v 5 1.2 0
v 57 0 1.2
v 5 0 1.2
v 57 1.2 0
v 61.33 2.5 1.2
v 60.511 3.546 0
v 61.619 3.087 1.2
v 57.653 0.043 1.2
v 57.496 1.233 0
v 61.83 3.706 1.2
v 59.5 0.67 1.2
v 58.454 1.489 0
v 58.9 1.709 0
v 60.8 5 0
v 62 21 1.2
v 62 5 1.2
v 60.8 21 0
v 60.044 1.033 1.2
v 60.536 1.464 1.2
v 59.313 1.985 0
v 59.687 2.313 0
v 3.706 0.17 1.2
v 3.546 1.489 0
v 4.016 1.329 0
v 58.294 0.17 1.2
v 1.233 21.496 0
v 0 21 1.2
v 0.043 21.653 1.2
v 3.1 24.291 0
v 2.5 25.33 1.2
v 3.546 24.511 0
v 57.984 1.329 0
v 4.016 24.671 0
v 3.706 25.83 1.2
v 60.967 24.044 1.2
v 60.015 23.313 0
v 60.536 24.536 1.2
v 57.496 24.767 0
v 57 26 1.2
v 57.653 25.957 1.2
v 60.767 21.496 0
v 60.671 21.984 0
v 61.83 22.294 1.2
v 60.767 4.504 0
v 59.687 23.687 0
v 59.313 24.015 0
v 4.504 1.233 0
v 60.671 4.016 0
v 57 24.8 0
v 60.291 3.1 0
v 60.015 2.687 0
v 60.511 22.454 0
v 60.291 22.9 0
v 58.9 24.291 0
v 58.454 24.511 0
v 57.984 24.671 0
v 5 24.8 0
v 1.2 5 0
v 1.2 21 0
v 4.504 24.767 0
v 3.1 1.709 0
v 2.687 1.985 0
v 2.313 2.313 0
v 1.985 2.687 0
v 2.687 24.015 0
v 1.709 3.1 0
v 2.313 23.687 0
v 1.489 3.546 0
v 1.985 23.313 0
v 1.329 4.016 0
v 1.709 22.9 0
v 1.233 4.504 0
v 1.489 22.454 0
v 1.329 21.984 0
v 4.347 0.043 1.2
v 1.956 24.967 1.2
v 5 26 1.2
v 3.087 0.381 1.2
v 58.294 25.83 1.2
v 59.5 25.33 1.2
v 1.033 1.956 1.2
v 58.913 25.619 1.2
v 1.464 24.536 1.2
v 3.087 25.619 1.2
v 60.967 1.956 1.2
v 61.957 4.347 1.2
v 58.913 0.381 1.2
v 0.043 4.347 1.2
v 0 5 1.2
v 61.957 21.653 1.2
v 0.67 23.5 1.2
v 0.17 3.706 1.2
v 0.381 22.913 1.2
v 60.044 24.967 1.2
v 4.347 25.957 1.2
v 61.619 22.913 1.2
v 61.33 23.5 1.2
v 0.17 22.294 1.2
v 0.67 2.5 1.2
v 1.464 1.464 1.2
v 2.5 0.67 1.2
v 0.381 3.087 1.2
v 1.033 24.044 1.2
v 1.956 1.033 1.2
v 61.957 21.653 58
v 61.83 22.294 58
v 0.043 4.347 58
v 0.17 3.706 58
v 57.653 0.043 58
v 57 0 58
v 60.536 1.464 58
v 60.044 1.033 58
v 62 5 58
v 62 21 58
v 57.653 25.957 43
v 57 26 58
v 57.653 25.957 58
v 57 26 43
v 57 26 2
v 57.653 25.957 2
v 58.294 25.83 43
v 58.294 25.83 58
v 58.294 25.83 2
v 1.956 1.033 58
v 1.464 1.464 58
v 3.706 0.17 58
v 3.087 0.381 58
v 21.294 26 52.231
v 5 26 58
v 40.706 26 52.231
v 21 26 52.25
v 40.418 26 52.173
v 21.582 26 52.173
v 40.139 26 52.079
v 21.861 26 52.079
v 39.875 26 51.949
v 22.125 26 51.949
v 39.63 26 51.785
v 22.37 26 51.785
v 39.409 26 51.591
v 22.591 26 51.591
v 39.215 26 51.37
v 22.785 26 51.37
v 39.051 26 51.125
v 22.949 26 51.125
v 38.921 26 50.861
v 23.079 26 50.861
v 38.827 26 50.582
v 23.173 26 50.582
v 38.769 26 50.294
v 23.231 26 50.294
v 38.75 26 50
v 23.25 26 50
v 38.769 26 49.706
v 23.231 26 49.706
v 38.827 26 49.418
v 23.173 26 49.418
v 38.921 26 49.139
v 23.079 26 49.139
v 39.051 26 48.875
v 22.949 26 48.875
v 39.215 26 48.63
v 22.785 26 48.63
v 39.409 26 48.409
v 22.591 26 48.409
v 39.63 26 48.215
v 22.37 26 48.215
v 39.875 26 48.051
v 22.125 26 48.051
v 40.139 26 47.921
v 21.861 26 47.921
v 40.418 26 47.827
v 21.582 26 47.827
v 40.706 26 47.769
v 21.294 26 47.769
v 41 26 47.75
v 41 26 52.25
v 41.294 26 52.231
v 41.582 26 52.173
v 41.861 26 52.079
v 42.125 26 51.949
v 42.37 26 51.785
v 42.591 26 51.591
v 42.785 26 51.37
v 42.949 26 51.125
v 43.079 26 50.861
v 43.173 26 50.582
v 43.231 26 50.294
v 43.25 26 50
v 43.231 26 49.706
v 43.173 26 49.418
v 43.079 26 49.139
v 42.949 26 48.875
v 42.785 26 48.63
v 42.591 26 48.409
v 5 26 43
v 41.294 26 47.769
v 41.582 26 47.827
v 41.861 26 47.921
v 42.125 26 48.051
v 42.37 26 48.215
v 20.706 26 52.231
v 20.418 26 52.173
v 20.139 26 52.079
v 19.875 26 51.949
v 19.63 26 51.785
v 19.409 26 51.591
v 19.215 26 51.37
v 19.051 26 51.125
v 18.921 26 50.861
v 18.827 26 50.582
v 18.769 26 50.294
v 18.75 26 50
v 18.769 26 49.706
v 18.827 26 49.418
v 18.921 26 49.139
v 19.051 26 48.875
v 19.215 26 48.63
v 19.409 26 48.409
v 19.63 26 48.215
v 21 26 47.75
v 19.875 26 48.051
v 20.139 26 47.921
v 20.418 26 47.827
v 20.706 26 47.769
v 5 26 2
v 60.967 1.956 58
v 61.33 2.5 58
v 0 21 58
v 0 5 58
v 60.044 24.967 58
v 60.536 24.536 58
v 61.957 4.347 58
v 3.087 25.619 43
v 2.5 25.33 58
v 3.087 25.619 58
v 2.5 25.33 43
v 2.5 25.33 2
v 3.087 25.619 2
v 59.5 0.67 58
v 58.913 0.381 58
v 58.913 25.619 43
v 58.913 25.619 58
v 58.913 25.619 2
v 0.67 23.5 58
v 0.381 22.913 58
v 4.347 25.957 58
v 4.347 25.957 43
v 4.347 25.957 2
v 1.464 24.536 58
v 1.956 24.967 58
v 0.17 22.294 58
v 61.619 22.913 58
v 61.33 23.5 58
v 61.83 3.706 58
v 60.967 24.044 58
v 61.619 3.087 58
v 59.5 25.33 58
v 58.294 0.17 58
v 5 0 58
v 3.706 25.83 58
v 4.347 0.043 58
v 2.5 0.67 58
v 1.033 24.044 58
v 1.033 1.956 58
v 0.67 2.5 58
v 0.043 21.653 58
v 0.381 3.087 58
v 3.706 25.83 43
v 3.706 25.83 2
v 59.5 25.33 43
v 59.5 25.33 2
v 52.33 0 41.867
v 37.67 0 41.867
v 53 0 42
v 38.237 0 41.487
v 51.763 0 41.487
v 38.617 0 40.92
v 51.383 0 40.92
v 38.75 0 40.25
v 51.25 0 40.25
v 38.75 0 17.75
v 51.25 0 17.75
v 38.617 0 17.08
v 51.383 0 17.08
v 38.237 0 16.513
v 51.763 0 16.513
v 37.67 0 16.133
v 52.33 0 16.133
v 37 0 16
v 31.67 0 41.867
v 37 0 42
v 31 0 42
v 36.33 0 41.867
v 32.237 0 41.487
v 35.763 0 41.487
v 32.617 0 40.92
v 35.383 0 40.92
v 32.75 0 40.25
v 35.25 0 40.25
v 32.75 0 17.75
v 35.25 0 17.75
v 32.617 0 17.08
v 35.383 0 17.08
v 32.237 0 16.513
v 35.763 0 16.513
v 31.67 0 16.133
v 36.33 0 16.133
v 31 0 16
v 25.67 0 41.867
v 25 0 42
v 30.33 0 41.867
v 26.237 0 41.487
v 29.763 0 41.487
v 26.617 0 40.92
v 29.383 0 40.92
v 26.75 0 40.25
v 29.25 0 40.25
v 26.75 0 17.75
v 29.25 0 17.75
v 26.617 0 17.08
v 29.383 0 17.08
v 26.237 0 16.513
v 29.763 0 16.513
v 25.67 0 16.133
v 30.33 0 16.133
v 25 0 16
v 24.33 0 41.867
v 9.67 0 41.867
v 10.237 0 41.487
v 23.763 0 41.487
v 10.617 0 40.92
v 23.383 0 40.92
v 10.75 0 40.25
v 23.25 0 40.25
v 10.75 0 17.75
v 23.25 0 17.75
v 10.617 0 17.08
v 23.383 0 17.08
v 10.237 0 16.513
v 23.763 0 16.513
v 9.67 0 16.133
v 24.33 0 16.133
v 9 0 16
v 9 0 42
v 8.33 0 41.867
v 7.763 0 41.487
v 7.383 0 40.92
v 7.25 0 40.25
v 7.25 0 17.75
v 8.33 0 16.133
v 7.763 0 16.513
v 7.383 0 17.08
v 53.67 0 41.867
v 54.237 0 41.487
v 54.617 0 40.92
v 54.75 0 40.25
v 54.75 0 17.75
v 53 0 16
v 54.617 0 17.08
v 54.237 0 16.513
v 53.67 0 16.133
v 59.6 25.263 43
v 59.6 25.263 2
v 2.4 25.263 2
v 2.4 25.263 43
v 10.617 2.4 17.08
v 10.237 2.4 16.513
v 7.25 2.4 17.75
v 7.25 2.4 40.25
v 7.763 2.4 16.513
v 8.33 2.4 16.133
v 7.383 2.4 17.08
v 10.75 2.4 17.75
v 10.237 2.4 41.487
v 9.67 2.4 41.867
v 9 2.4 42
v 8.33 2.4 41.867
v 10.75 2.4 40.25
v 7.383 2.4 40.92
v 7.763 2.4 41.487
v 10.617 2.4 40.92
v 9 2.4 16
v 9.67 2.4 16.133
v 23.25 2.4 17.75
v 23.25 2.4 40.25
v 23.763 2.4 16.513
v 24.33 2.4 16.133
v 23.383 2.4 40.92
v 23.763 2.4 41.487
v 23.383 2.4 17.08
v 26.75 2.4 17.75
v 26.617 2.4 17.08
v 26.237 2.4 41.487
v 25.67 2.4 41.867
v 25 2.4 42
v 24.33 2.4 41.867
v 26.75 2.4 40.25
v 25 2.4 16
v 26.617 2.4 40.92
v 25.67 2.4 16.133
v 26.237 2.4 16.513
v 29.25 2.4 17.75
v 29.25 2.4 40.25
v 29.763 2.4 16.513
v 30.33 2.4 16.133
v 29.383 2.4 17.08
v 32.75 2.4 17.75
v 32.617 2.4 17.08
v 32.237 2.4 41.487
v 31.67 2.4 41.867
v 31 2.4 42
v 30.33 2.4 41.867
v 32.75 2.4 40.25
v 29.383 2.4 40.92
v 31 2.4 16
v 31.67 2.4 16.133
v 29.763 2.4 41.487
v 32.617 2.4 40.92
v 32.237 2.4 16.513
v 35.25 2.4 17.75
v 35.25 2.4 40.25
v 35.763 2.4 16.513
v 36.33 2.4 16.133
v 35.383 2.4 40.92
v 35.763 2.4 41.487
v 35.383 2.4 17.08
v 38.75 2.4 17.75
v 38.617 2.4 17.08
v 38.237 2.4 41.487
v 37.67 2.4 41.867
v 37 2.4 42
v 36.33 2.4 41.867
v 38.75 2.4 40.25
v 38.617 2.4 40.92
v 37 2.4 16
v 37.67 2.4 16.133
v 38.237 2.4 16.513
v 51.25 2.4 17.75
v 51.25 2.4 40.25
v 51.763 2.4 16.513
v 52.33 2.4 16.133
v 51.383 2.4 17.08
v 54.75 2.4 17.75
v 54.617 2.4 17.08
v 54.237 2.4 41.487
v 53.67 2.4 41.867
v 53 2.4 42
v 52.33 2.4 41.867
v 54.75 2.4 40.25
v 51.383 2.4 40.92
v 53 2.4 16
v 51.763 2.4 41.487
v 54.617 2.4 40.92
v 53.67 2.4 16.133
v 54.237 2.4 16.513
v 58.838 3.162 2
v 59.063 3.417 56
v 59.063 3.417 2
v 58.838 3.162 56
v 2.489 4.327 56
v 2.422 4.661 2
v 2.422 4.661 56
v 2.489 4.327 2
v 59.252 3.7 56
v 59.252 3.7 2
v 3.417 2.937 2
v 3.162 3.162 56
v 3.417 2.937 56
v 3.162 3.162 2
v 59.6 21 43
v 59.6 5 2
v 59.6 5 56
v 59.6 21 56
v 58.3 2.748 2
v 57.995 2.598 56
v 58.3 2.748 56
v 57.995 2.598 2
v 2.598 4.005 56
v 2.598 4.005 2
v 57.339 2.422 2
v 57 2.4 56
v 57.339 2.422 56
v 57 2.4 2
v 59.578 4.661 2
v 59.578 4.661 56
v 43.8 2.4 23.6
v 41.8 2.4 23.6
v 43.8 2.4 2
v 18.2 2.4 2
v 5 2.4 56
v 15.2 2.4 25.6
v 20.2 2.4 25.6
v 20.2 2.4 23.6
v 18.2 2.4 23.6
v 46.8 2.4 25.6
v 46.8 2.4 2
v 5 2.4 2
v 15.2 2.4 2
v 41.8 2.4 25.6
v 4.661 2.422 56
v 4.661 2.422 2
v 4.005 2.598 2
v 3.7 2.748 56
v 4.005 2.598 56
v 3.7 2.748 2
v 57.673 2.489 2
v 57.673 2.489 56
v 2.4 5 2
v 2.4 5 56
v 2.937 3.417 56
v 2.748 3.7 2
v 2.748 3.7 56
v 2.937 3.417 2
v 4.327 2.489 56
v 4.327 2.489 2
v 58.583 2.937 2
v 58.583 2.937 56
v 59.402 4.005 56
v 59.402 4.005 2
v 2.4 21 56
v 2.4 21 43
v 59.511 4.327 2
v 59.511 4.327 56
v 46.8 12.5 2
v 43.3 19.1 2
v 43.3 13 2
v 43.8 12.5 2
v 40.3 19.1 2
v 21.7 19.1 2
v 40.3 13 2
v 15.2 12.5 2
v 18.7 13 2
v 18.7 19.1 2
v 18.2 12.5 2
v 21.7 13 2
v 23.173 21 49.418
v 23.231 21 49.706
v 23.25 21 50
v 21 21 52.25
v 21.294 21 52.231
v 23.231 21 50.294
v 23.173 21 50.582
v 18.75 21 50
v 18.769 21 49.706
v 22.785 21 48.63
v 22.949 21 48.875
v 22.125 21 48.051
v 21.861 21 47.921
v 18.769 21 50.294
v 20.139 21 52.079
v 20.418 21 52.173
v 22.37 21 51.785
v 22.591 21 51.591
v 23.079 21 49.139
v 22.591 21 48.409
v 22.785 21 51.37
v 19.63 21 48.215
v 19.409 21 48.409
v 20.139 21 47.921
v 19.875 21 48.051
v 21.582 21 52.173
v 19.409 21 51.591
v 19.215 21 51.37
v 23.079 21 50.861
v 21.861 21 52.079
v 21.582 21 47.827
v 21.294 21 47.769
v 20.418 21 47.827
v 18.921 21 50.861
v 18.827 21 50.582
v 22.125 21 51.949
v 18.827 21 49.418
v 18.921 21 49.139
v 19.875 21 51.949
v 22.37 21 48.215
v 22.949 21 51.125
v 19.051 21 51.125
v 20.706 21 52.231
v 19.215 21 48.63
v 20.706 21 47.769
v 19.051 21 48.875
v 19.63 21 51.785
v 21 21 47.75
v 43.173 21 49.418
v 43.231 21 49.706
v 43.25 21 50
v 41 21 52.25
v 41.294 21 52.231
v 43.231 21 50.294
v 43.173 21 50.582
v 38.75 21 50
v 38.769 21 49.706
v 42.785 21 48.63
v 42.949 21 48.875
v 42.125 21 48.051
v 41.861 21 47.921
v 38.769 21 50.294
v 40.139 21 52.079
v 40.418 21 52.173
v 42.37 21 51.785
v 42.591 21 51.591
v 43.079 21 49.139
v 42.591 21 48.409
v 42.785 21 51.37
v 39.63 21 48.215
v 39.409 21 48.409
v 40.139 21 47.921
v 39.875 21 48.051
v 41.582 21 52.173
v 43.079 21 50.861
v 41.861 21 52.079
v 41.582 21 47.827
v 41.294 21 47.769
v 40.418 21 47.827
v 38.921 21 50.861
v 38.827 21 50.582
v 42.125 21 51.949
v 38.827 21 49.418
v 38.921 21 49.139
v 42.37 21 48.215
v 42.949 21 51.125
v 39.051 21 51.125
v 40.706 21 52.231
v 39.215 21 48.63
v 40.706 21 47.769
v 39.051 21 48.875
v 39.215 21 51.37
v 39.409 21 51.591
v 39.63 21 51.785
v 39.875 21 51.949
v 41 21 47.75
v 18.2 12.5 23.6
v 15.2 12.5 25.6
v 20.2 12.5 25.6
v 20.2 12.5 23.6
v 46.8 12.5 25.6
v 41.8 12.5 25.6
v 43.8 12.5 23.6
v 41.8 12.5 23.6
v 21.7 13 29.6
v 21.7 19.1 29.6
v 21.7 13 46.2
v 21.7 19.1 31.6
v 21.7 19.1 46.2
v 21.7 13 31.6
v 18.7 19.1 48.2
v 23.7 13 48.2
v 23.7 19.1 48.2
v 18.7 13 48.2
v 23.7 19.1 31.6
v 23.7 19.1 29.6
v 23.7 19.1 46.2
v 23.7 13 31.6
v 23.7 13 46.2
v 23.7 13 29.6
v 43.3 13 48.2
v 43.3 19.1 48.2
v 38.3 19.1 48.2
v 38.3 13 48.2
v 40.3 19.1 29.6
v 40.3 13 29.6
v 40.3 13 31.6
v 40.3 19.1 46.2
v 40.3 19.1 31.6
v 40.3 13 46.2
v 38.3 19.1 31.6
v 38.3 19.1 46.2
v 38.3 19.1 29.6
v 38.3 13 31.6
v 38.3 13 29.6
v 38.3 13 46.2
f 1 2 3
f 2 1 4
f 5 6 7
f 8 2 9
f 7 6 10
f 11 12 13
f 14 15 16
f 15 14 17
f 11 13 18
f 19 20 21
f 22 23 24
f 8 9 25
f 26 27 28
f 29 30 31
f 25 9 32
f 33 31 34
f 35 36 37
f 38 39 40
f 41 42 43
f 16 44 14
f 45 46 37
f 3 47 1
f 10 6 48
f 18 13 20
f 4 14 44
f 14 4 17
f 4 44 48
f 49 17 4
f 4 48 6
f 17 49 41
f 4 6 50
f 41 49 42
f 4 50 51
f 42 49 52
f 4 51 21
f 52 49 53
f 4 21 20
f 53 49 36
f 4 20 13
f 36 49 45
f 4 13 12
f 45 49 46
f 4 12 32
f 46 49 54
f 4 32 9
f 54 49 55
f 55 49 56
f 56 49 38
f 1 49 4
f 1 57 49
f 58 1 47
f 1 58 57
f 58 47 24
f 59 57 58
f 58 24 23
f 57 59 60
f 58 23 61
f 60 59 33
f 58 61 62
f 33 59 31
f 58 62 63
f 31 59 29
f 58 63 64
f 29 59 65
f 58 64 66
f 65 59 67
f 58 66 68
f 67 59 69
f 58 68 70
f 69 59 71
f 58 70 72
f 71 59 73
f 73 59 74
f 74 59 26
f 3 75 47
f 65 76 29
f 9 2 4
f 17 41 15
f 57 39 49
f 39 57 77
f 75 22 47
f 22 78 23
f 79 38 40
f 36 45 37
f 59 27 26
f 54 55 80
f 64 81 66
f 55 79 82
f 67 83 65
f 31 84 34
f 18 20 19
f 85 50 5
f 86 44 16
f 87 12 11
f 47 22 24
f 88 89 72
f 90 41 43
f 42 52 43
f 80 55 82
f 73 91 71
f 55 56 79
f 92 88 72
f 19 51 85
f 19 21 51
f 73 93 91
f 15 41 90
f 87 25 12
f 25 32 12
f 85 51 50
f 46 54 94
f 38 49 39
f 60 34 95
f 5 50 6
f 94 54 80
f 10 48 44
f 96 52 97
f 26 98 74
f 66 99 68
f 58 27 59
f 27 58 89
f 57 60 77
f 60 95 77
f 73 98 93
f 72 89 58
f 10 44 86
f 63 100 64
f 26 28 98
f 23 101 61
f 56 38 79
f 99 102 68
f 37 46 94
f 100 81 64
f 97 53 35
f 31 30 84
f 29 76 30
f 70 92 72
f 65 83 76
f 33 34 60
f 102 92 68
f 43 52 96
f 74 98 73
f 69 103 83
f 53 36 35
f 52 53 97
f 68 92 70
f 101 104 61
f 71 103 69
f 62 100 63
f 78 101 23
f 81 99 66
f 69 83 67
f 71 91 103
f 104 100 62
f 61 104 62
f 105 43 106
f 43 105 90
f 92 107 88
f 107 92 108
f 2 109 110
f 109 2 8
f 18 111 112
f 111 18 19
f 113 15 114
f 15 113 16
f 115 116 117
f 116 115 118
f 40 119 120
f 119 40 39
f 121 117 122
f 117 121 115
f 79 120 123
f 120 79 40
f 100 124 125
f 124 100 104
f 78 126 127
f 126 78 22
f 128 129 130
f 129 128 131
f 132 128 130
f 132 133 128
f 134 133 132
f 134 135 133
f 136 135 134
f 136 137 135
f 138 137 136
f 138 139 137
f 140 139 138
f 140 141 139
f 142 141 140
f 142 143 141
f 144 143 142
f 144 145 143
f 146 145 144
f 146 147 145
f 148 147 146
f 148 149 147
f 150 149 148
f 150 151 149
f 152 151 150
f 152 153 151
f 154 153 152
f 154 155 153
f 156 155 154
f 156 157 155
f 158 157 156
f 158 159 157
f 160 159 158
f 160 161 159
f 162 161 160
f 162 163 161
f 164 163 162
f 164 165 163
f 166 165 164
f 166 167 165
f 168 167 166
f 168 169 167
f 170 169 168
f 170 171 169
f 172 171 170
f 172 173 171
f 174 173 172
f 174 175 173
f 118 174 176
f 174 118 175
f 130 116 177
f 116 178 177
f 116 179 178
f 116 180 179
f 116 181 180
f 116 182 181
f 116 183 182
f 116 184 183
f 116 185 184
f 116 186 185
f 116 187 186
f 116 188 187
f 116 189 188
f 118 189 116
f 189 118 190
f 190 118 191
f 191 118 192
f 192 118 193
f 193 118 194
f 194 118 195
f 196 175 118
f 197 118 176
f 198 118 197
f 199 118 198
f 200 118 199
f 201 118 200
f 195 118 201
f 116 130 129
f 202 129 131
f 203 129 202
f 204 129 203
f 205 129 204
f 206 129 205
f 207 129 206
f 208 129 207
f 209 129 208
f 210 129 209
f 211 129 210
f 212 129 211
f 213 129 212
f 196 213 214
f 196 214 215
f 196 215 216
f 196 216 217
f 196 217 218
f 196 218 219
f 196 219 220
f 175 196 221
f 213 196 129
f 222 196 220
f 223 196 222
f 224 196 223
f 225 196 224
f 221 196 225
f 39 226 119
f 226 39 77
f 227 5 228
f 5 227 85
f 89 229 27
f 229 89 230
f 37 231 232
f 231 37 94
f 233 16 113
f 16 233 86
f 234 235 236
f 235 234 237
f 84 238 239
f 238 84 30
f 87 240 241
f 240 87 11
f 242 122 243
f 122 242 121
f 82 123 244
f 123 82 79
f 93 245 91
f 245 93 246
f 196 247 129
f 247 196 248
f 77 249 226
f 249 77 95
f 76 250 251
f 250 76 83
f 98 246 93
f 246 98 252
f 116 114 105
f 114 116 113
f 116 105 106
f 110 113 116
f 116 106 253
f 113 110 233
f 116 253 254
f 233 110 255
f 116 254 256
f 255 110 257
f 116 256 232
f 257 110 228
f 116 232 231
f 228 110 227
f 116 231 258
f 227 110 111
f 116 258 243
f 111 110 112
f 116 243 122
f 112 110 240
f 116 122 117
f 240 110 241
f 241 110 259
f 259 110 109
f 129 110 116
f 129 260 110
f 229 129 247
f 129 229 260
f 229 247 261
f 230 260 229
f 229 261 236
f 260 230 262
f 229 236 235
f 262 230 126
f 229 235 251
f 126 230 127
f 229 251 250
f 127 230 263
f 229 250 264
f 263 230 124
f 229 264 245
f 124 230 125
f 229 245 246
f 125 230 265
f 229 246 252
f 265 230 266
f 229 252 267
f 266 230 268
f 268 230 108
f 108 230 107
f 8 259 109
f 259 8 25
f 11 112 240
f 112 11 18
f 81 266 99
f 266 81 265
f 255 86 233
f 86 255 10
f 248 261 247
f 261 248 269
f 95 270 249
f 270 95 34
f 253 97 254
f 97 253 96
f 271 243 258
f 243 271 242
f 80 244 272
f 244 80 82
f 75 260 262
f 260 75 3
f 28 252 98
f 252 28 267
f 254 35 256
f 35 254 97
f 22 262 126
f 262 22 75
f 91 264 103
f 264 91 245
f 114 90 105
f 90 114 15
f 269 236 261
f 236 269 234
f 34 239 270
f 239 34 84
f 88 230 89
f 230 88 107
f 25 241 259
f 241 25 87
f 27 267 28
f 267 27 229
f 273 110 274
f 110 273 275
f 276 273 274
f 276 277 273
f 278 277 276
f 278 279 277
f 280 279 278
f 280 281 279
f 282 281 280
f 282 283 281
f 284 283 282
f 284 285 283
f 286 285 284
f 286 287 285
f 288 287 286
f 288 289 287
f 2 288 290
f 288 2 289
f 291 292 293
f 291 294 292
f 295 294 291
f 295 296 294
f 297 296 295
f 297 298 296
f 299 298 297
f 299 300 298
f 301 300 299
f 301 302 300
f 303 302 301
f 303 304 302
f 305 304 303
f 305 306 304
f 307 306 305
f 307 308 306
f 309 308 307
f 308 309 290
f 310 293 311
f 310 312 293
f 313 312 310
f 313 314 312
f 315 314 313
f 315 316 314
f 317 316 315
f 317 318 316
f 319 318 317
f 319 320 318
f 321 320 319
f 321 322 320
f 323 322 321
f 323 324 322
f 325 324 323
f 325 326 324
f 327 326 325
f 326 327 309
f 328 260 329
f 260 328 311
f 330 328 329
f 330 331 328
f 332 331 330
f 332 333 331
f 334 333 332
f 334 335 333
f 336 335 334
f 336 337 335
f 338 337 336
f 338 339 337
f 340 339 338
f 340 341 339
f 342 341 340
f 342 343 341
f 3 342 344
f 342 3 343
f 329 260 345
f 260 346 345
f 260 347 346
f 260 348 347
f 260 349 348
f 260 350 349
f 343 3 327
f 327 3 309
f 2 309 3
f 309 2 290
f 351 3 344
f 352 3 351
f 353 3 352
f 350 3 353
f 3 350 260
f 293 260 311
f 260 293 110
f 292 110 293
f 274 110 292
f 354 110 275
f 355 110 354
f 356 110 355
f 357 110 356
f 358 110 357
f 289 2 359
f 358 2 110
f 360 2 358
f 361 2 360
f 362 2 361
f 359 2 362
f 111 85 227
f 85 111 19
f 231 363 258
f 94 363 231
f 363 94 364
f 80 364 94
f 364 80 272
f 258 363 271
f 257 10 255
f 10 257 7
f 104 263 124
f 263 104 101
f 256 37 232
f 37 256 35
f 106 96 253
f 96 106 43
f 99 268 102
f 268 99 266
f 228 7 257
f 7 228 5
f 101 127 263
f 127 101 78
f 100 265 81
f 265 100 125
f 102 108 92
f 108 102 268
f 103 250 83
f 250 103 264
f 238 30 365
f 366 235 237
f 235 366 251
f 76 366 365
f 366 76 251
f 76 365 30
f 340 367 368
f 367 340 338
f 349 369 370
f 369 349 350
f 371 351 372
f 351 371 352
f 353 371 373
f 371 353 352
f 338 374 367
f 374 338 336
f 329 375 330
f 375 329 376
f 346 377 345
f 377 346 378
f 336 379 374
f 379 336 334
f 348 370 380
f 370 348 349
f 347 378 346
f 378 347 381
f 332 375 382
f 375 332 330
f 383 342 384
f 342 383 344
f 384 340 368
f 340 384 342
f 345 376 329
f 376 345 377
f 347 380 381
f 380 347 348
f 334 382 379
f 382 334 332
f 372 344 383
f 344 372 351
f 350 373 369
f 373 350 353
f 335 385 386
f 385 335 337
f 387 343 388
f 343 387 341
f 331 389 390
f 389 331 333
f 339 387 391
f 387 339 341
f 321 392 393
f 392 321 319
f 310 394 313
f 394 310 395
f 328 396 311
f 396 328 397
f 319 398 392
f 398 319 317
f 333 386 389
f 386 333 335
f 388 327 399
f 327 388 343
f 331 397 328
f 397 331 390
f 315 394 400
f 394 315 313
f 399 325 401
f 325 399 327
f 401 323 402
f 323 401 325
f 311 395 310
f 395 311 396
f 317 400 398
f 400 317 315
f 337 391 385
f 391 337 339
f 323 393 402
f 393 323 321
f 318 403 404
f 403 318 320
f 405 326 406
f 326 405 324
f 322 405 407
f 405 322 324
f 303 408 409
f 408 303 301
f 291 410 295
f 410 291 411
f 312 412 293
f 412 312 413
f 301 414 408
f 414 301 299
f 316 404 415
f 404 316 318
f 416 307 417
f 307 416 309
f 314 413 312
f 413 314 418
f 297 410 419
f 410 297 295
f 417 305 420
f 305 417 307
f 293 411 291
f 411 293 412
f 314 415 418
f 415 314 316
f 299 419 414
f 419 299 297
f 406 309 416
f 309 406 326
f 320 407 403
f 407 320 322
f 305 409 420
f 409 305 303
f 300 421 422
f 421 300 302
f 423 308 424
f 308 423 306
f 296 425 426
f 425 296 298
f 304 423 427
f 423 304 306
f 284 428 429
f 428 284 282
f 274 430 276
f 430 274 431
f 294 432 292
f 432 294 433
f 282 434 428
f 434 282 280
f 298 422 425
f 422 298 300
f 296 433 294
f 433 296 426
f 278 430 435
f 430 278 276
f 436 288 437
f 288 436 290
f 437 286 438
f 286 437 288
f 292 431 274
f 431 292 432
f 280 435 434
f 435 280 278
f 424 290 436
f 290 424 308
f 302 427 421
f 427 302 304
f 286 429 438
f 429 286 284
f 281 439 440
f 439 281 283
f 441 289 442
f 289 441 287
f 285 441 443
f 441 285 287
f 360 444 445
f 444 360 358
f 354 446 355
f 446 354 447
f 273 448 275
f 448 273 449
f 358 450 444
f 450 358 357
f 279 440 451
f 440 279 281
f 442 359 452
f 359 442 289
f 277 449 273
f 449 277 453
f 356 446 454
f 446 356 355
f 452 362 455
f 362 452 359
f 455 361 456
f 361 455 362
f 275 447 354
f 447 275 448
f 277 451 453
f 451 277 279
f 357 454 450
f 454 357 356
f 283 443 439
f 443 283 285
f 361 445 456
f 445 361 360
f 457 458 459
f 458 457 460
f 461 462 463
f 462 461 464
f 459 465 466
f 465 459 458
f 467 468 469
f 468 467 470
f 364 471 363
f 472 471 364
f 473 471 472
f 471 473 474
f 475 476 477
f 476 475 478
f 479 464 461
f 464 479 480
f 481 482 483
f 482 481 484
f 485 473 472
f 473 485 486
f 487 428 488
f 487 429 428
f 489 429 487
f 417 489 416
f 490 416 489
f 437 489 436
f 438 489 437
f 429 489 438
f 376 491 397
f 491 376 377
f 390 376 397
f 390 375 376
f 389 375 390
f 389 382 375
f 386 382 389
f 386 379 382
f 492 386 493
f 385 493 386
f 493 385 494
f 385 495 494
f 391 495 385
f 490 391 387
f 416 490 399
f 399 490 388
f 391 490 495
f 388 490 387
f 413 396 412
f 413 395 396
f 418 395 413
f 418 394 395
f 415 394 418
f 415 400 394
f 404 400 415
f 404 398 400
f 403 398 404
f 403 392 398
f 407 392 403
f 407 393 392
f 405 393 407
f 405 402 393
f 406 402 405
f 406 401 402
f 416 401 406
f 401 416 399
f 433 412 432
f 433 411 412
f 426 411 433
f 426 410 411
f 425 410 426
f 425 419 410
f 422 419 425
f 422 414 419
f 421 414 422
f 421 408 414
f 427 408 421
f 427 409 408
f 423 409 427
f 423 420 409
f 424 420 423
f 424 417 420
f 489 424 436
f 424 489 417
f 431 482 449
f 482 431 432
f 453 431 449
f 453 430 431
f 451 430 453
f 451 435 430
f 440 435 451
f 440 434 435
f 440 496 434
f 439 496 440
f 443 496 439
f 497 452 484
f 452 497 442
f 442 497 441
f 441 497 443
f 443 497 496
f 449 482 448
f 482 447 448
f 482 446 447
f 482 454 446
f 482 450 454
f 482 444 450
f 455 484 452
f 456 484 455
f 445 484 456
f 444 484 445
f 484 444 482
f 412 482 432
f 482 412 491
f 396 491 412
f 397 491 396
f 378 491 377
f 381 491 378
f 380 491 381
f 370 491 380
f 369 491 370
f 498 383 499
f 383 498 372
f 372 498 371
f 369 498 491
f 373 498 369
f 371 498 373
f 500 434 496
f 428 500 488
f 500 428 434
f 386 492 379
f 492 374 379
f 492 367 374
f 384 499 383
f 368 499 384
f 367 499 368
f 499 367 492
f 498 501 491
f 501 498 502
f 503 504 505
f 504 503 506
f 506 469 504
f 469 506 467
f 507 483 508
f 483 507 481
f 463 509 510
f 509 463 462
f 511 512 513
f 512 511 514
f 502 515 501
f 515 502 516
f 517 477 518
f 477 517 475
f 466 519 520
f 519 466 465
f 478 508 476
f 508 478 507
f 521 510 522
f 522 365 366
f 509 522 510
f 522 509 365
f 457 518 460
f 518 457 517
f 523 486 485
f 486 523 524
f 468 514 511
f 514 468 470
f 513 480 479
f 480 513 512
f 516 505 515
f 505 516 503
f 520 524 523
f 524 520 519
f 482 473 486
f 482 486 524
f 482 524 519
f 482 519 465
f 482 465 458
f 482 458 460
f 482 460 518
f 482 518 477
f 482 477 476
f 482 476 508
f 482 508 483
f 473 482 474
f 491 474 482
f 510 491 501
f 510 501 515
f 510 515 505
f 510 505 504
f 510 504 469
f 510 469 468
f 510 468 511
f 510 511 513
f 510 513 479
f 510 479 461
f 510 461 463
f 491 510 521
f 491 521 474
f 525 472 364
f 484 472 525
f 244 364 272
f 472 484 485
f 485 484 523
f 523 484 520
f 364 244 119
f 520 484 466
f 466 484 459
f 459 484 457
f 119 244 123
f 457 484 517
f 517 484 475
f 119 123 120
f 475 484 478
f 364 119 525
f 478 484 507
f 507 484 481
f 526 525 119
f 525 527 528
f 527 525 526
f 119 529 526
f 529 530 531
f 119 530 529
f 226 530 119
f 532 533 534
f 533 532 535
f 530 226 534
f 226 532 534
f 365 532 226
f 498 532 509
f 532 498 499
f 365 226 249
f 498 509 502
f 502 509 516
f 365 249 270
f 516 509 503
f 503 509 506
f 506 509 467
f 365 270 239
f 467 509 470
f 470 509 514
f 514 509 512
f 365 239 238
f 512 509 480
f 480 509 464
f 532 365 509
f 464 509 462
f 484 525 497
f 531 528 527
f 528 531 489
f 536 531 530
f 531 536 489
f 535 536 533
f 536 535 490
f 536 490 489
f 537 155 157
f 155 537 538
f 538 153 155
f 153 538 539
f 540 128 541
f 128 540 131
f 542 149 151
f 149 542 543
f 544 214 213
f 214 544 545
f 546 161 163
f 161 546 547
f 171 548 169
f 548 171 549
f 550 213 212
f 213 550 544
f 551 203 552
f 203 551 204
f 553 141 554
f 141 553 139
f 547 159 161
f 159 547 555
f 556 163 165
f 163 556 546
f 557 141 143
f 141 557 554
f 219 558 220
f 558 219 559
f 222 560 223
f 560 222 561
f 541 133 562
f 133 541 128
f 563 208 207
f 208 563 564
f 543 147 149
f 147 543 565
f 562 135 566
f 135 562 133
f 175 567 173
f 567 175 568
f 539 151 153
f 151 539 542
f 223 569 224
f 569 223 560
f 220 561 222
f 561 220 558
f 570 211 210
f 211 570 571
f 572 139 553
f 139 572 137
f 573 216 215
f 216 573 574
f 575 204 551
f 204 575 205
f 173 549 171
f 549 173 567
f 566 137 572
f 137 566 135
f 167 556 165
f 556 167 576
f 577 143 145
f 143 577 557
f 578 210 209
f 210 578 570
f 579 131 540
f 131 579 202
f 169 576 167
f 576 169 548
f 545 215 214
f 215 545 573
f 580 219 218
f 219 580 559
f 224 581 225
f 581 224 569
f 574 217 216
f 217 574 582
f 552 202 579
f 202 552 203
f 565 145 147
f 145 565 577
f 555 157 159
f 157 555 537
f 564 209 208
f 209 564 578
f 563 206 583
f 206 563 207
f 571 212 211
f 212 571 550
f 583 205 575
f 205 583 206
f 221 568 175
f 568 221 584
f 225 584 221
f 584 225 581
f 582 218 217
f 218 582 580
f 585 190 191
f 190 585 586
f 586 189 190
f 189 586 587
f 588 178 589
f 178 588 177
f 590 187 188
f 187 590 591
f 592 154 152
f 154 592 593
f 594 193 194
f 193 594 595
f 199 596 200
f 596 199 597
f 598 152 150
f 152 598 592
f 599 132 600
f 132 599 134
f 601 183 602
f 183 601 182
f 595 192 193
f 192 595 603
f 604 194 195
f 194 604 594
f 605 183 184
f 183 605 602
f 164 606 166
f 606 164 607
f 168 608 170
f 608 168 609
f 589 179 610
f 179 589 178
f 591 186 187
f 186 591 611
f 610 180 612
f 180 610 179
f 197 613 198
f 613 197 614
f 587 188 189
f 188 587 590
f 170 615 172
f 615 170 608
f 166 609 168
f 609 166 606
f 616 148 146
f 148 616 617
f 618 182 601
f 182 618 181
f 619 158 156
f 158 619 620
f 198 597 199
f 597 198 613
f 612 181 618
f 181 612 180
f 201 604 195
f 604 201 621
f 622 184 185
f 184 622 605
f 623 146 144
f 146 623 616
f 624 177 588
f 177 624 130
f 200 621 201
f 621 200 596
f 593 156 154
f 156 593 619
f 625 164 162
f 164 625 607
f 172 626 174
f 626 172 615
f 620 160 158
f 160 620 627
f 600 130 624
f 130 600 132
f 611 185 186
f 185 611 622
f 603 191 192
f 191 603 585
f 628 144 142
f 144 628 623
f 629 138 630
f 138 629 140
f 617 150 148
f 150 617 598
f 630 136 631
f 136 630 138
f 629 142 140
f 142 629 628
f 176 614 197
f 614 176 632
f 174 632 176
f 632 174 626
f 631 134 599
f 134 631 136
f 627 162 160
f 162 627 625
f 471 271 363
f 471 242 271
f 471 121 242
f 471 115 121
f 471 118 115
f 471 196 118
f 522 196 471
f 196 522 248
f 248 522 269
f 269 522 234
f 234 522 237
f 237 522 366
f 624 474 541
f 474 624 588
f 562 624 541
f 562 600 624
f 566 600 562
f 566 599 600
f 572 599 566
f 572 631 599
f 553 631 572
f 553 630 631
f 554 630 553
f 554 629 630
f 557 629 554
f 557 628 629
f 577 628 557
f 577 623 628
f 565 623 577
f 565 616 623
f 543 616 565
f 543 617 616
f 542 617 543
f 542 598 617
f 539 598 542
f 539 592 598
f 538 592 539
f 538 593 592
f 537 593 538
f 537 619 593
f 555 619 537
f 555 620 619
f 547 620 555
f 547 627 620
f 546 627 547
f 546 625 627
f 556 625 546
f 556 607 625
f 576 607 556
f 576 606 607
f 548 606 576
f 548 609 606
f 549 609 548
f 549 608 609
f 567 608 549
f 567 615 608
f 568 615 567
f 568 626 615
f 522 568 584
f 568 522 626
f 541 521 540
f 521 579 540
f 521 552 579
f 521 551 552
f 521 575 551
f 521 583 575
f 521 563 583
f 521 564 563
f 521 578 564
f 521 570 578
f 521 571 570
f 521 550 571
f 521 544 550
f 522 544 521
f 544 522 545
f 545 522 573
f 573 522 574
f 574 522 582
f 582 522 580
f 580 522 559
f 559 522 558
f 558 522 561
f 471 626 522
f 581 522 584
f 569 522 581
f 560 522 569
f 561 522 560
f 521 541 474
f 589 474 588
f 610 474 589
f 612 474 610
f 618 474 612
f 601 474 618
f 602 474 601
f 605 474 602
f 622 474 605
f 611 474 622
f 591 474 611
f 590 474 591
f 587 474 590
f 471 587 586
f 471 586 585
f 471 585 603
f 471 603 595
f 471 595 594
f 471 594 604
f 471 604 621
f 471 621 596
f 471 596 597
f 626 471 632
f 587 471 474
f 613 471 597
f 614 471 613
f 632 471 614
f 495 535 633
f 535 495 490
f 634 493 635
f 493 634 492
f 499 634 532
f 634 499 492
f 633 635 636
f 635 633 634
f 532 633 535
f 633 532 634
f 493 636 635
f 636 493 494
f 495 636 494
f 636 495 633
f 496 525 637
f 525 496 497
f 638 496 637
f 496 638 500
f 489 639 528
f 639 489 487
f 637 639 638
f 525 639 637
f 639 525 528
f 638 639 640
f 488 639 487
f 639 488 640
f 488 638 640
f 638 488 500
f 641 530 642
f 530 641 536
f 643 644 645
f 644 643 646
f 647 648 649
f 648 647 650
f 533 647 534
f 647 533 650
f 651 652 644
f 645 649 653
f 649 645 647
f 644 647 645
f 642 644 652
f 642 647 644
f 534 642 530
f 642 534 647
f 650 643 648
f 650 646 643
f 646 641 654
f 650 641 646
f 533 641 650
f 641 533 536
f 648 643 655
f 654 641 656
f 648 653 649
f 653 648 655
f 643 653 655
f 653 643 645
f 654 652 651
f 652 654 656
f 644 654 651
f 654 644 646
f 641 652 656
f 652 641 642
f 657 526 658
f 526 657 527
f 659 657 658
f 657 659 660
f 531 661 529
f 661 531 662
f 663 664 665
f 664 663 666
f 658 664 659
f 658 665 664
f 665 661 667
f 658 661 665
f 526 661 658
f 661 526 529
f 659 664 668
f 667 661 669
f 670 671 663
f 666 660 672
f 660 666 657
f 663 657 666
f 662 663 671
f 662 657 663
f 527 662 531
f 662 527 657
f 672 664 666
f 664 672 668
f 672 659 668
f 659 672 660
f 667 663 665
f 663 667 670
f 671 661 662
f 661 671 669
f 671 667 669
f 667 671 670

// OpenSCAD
// file: ../common.scad
/* =============================================================================
 * 智慧香爐 — 共用輔助模組
 * =============================================================================
 * 圓角方柱、倒角、通風柵格、螺柱、頂緣台階、定位榫。
 * 零件檔一律 include 本檔（會連帶帶進 params.scad）。
 * ============================================================================= */

include <params.scad>

// ═══════════════════════════════════════════════════════════════════════════
// 共用輔助模組
// ═══════════════════════════════════════════════════════════════════════════

// 圓角方柱：用 4 根圓柱做 hull，比 minkowski 快很多
module rrect(w, d, h, r) {
    hull() {
        for (x = [r, w - r], y = [r, d - r])
            translate([x, y, 0]) cylinder(h = h, r = r);
    }
}

// 圓角方柱（底緣倒角版）：改善首層附著並讓外型更柔和
module rrect_chamfered(w, d, h, r, c = CHAMFER) {
    union() {
        // 倒角裙邊
        hull() {
            for (x = [r, w - r], y = [r, d - r])
                translate([x, y, 0]) cylinder(h = c, r1 = r - c, r2 = r);
        }
        translate([0, 0, c]) rrect(w, d, h - c, r);
    }
}

// 螺柱座（含自攻底孔）。pilot 依板子自己的孔徑給，不是統一值。
module standoff(h = STANDOFF_H, pilot = M3_PILOT) {
    difference() {
        cylinder(h = h, d = standoff_od(pilot));
        translate([0, 0, -0.1]) cylinder(h = h + 0.2, d = pilot);
    }
}

// 通風柵格：一排長圓孔。用於側面進氣與感測器艙開口。
module vent_slots(n, slot_w, slot_h, pitch, depth) {
    for (i = [0 : n - 1])
        translate([i * pitch, 0, 0])
            hull() {
                translate([0, slot_h / 2 - slot_w / 2, 0])
                    cylinder(h = depth, d = slot_w, $fn = 16);
                translate([0, -slot_h / 2 + slot_w / 2, 0])
                    cylinder(h = depth, d = slot_w, $fn = 16);
            }
}

// 頂緣承接台階：讓定位榫有實體可坐，同時作為上層零件的落座面
module top_ledge(w, d, z, r) {
    translate([0, 0, z])
        difference() {
            translate([WALL, WALL, 0])
                rrect(w - WALL * 2, d - WALL * 2, LEDGE_H, r - WALL);
            translate([WALL + LEDGE_W, WALL + LEDGE_W, -0.1])
                rrect(w - (WALL + LEDGE_W) * 2, d - (WALL + LEDGE_W) * 2,
                      LEDGE_H + 0.2, max(r - WALL - LEDGE_W, 0.5));
        }
}

// 定位榫（公）：四角
module tenons_male(w, d, z) {
    for (x = [TENON_INSET, w - TENON_INSET], y = [TENON_INSET, d - TENON_INSET])
        translate([x, y, z])
            cylinder(h = TENON_H, d1 = TENON_D, d2 = TENON_D - 1.2);  // 帶錐度好插入
}

// 定位榫（母）：對應的孔
module tenons_female(w, d, z) {
    for (x = [TENON_INSET, w - TENON_INSET], y = [TENON_INSET, d - TENON_INSET])
        translate([x, y, z - 0.1])
            cylinder(h = TENON_H + 0.2, d = TENON_D + FIT * 2);
}
// main file
/* =============================================================================
 * 智慧香爐 — 零件：感測器艙
 * =============================================================================
 * 尺寸全部來自 ../params.scad，本檔不寫死任何數字。
 *
 * 單獨開這個檔（F5／F6）會直接看到這個零件；被 incense_burner.scad 以
 * ★use<>★ 引入時，檔尾的預覽呼叫不會執行——use 只帶進模組、不執行對方的
 * 頂層敘述，這正是「一檔一零件」又不污染組合件的作法。
 * ============================================================================= */

include <../common.scad>

// ═══════════════════════════════════════════════════════════════════════════
// 零件 5：感測器艙
// ═══════════════════════════════════════════════════════════════════════════
// 位置在前方下緣，遠離熱源，開口朝向參拜者呼吸帶——
// 這符合 FSM 用 CO2 斜率偵測人潮的設計意圖：量的是「人呼吸到的空氣」。
// ★2026-08-02 重寫★ 原本掛耳與模組卡槽都寫在 difference() 的 union() 裡，
//   但內部挖空 rrect(..., POD_D - WALL, ...) 從 y=WALL 一路開到 y=POD_D
//   （背面全開），把落在那個範圍內的掛耳與卡槽★整個吃掉★——
//   算出來的仍是合法實體，Volumes=2、watertight、參數檢查全過，
//   但功能特徵根本不存在：艙體鎖不上底座，感測器也沒東西夾。
//   （是把零件單獨算繪出來看背面才發現的，數值檢查一項都沒響。）
//   修法：挖空只作用在「殼」上，掛耳與定位肋在挖空之後才 union 進來。
module pod_ear() {
    difference() {
        cube([POD_EAR_W, POD_EAR_T, POD_EAR_H]);
        for (dx = [-1, 1])
            translate([POD_EAR_W / 2 + dx * POD_EAR_PITCH / 2, -0.1, POD_EAR_H / 2])
                rotate([-90, 0, 0])
                    cylinder(h = POD_EAR_T + 0.2, d = M4_CLEAR);
    }
}

// 模組定位肋：兩側各一道，夾住 PCB 的左右邊緣。
// ★不做成封閉滑槽★ 兩個理由：
//   1) 艙內高度不夠讓 PCB 從上往下滑進槽裡（上方只剩 8mm，板高 14mm）
//   2) 不需要——背面開放，PCB 由背面推入貼著前壁；
//      感測器艙鎖上底座後，底座前壁就是後擋板，把 PCB 壓住
// 肋條一路從艙底（FLOOR）長上來，不從半空開始，否則第一層無支撐。
module pod_rails(pcb_w, y0, depth, z0, z_len) {
    span = pcb_w + FIT * 2;
    top  = z0 + z_len;
    for (dx = [-1, 1]) {
        A  = POD_W / 2 + dx * (span / 2);        // PCB 的左／右邊緣
        rx = dx > 0 ? A : A - POD_RIB_W;         // 肋條一律長在 PCB 外側
        // 上擋／下擋：★只在肋條上做往內伸 2mm 的小凸耳，不做橫跨整寬的擋片★
        //   橫跨整寬的擋片會壓在前壁的通風槽上——驗證 L 抓到的就是這個：
        //   兩道擋片共擋掉 115mm³，等於把中間三道槽各截去 2mm 高度。
        //   凸耳只佔 PCB 兩側角落，通風槽的視線完全不受影響。
        // ★凸耳必須埋進肋條 1mm★ 只靠邊對邊接觸會產生非流形邊
        //   （Simple=no，切片器直接拒收）——這也踩過一次。
        tx = dx > 0 ? A - 2 : A - 1;
        translate([rx, y0, FLOOR])
            cube([POD_RIB_W, depth, top + 2 - FLOOR]);
        translate([tx, y0, top]) cube([3, depth, 2]);
        if (z0 > FLOOR + 0.01)       // z0 就在艙底時，艙底本身就是落座面
            translate([tx, y0, z0 - 2]) cube([3, depth, 2]);
    }
}

module sensor_pod() {
    union() {
        difference() {
            rrect_chamfered(POD_W, POD_D, POD_H, 5);

            // 內部挖空（背面開放，方便置入模組與走線）
            // 背面加 OVER，不讓切面停在與外殼共平面的位置（見檔頭 OVER 說明）。
            translate([WALL, WALL, FLOOR])
                rrect(POD_W - WALL * 2, POD_D - WALL + OVER, POD_H - FLOOR * 2,
                      5 - WALL);

            // 前面通風柵格——感測器必須接觸到外界空氣才量得準。
            // ★x 位置必須避開背面的定位肋★ 肋條貼在前壁內面，
            //   壓在槽上就等於把槽封死：外面看得到孔，裡面其實不通氣。
            //   （原本 5 槽等距 pitch=8，正好被兩對肋壓住兩槽）
            for (vx = POD_VENT_X)
                translate([vx, -0.5, POD_H / 2]) rotate([-90, 0, 0])
                    vent_slots(1, 3.5, 26, 0, WALL + 1);
        }

        // 背面掛耳（M4 鎖到底座前壁的螺柱上）——★必須在挖空之後★
        // 用外輪廓 intersection 修邊，橫樑才不會從圓角處凸出去。
        intersection() {
            translate([POD_EAR_X, POD_D - POD_EAR_T, POD_EAR_Z]) pod_ear();
            rrect(POD_W, POD_D, POD_H, 5);
        }

        // 模組定位肋（下 SCD41、上 SHT31）——★同樣必須在挖空之後★
        pod_rails(SCD41_W, POD_Y_SCD, POD_RIB_D_SCD, FLOOR, SCD41_D + FIT * 2);
        pod_rails(SHT31_W, POD_Y_SHT, POD_RIB_D_SHT,
                  FLOOR + SCD41_D + FIT * 2 + 8, SHT31_D + FIT * 2);
    }
}

// ── 單獨開檔時的預覽（被 use<> 引入時不執行）──
sensor_pod();
